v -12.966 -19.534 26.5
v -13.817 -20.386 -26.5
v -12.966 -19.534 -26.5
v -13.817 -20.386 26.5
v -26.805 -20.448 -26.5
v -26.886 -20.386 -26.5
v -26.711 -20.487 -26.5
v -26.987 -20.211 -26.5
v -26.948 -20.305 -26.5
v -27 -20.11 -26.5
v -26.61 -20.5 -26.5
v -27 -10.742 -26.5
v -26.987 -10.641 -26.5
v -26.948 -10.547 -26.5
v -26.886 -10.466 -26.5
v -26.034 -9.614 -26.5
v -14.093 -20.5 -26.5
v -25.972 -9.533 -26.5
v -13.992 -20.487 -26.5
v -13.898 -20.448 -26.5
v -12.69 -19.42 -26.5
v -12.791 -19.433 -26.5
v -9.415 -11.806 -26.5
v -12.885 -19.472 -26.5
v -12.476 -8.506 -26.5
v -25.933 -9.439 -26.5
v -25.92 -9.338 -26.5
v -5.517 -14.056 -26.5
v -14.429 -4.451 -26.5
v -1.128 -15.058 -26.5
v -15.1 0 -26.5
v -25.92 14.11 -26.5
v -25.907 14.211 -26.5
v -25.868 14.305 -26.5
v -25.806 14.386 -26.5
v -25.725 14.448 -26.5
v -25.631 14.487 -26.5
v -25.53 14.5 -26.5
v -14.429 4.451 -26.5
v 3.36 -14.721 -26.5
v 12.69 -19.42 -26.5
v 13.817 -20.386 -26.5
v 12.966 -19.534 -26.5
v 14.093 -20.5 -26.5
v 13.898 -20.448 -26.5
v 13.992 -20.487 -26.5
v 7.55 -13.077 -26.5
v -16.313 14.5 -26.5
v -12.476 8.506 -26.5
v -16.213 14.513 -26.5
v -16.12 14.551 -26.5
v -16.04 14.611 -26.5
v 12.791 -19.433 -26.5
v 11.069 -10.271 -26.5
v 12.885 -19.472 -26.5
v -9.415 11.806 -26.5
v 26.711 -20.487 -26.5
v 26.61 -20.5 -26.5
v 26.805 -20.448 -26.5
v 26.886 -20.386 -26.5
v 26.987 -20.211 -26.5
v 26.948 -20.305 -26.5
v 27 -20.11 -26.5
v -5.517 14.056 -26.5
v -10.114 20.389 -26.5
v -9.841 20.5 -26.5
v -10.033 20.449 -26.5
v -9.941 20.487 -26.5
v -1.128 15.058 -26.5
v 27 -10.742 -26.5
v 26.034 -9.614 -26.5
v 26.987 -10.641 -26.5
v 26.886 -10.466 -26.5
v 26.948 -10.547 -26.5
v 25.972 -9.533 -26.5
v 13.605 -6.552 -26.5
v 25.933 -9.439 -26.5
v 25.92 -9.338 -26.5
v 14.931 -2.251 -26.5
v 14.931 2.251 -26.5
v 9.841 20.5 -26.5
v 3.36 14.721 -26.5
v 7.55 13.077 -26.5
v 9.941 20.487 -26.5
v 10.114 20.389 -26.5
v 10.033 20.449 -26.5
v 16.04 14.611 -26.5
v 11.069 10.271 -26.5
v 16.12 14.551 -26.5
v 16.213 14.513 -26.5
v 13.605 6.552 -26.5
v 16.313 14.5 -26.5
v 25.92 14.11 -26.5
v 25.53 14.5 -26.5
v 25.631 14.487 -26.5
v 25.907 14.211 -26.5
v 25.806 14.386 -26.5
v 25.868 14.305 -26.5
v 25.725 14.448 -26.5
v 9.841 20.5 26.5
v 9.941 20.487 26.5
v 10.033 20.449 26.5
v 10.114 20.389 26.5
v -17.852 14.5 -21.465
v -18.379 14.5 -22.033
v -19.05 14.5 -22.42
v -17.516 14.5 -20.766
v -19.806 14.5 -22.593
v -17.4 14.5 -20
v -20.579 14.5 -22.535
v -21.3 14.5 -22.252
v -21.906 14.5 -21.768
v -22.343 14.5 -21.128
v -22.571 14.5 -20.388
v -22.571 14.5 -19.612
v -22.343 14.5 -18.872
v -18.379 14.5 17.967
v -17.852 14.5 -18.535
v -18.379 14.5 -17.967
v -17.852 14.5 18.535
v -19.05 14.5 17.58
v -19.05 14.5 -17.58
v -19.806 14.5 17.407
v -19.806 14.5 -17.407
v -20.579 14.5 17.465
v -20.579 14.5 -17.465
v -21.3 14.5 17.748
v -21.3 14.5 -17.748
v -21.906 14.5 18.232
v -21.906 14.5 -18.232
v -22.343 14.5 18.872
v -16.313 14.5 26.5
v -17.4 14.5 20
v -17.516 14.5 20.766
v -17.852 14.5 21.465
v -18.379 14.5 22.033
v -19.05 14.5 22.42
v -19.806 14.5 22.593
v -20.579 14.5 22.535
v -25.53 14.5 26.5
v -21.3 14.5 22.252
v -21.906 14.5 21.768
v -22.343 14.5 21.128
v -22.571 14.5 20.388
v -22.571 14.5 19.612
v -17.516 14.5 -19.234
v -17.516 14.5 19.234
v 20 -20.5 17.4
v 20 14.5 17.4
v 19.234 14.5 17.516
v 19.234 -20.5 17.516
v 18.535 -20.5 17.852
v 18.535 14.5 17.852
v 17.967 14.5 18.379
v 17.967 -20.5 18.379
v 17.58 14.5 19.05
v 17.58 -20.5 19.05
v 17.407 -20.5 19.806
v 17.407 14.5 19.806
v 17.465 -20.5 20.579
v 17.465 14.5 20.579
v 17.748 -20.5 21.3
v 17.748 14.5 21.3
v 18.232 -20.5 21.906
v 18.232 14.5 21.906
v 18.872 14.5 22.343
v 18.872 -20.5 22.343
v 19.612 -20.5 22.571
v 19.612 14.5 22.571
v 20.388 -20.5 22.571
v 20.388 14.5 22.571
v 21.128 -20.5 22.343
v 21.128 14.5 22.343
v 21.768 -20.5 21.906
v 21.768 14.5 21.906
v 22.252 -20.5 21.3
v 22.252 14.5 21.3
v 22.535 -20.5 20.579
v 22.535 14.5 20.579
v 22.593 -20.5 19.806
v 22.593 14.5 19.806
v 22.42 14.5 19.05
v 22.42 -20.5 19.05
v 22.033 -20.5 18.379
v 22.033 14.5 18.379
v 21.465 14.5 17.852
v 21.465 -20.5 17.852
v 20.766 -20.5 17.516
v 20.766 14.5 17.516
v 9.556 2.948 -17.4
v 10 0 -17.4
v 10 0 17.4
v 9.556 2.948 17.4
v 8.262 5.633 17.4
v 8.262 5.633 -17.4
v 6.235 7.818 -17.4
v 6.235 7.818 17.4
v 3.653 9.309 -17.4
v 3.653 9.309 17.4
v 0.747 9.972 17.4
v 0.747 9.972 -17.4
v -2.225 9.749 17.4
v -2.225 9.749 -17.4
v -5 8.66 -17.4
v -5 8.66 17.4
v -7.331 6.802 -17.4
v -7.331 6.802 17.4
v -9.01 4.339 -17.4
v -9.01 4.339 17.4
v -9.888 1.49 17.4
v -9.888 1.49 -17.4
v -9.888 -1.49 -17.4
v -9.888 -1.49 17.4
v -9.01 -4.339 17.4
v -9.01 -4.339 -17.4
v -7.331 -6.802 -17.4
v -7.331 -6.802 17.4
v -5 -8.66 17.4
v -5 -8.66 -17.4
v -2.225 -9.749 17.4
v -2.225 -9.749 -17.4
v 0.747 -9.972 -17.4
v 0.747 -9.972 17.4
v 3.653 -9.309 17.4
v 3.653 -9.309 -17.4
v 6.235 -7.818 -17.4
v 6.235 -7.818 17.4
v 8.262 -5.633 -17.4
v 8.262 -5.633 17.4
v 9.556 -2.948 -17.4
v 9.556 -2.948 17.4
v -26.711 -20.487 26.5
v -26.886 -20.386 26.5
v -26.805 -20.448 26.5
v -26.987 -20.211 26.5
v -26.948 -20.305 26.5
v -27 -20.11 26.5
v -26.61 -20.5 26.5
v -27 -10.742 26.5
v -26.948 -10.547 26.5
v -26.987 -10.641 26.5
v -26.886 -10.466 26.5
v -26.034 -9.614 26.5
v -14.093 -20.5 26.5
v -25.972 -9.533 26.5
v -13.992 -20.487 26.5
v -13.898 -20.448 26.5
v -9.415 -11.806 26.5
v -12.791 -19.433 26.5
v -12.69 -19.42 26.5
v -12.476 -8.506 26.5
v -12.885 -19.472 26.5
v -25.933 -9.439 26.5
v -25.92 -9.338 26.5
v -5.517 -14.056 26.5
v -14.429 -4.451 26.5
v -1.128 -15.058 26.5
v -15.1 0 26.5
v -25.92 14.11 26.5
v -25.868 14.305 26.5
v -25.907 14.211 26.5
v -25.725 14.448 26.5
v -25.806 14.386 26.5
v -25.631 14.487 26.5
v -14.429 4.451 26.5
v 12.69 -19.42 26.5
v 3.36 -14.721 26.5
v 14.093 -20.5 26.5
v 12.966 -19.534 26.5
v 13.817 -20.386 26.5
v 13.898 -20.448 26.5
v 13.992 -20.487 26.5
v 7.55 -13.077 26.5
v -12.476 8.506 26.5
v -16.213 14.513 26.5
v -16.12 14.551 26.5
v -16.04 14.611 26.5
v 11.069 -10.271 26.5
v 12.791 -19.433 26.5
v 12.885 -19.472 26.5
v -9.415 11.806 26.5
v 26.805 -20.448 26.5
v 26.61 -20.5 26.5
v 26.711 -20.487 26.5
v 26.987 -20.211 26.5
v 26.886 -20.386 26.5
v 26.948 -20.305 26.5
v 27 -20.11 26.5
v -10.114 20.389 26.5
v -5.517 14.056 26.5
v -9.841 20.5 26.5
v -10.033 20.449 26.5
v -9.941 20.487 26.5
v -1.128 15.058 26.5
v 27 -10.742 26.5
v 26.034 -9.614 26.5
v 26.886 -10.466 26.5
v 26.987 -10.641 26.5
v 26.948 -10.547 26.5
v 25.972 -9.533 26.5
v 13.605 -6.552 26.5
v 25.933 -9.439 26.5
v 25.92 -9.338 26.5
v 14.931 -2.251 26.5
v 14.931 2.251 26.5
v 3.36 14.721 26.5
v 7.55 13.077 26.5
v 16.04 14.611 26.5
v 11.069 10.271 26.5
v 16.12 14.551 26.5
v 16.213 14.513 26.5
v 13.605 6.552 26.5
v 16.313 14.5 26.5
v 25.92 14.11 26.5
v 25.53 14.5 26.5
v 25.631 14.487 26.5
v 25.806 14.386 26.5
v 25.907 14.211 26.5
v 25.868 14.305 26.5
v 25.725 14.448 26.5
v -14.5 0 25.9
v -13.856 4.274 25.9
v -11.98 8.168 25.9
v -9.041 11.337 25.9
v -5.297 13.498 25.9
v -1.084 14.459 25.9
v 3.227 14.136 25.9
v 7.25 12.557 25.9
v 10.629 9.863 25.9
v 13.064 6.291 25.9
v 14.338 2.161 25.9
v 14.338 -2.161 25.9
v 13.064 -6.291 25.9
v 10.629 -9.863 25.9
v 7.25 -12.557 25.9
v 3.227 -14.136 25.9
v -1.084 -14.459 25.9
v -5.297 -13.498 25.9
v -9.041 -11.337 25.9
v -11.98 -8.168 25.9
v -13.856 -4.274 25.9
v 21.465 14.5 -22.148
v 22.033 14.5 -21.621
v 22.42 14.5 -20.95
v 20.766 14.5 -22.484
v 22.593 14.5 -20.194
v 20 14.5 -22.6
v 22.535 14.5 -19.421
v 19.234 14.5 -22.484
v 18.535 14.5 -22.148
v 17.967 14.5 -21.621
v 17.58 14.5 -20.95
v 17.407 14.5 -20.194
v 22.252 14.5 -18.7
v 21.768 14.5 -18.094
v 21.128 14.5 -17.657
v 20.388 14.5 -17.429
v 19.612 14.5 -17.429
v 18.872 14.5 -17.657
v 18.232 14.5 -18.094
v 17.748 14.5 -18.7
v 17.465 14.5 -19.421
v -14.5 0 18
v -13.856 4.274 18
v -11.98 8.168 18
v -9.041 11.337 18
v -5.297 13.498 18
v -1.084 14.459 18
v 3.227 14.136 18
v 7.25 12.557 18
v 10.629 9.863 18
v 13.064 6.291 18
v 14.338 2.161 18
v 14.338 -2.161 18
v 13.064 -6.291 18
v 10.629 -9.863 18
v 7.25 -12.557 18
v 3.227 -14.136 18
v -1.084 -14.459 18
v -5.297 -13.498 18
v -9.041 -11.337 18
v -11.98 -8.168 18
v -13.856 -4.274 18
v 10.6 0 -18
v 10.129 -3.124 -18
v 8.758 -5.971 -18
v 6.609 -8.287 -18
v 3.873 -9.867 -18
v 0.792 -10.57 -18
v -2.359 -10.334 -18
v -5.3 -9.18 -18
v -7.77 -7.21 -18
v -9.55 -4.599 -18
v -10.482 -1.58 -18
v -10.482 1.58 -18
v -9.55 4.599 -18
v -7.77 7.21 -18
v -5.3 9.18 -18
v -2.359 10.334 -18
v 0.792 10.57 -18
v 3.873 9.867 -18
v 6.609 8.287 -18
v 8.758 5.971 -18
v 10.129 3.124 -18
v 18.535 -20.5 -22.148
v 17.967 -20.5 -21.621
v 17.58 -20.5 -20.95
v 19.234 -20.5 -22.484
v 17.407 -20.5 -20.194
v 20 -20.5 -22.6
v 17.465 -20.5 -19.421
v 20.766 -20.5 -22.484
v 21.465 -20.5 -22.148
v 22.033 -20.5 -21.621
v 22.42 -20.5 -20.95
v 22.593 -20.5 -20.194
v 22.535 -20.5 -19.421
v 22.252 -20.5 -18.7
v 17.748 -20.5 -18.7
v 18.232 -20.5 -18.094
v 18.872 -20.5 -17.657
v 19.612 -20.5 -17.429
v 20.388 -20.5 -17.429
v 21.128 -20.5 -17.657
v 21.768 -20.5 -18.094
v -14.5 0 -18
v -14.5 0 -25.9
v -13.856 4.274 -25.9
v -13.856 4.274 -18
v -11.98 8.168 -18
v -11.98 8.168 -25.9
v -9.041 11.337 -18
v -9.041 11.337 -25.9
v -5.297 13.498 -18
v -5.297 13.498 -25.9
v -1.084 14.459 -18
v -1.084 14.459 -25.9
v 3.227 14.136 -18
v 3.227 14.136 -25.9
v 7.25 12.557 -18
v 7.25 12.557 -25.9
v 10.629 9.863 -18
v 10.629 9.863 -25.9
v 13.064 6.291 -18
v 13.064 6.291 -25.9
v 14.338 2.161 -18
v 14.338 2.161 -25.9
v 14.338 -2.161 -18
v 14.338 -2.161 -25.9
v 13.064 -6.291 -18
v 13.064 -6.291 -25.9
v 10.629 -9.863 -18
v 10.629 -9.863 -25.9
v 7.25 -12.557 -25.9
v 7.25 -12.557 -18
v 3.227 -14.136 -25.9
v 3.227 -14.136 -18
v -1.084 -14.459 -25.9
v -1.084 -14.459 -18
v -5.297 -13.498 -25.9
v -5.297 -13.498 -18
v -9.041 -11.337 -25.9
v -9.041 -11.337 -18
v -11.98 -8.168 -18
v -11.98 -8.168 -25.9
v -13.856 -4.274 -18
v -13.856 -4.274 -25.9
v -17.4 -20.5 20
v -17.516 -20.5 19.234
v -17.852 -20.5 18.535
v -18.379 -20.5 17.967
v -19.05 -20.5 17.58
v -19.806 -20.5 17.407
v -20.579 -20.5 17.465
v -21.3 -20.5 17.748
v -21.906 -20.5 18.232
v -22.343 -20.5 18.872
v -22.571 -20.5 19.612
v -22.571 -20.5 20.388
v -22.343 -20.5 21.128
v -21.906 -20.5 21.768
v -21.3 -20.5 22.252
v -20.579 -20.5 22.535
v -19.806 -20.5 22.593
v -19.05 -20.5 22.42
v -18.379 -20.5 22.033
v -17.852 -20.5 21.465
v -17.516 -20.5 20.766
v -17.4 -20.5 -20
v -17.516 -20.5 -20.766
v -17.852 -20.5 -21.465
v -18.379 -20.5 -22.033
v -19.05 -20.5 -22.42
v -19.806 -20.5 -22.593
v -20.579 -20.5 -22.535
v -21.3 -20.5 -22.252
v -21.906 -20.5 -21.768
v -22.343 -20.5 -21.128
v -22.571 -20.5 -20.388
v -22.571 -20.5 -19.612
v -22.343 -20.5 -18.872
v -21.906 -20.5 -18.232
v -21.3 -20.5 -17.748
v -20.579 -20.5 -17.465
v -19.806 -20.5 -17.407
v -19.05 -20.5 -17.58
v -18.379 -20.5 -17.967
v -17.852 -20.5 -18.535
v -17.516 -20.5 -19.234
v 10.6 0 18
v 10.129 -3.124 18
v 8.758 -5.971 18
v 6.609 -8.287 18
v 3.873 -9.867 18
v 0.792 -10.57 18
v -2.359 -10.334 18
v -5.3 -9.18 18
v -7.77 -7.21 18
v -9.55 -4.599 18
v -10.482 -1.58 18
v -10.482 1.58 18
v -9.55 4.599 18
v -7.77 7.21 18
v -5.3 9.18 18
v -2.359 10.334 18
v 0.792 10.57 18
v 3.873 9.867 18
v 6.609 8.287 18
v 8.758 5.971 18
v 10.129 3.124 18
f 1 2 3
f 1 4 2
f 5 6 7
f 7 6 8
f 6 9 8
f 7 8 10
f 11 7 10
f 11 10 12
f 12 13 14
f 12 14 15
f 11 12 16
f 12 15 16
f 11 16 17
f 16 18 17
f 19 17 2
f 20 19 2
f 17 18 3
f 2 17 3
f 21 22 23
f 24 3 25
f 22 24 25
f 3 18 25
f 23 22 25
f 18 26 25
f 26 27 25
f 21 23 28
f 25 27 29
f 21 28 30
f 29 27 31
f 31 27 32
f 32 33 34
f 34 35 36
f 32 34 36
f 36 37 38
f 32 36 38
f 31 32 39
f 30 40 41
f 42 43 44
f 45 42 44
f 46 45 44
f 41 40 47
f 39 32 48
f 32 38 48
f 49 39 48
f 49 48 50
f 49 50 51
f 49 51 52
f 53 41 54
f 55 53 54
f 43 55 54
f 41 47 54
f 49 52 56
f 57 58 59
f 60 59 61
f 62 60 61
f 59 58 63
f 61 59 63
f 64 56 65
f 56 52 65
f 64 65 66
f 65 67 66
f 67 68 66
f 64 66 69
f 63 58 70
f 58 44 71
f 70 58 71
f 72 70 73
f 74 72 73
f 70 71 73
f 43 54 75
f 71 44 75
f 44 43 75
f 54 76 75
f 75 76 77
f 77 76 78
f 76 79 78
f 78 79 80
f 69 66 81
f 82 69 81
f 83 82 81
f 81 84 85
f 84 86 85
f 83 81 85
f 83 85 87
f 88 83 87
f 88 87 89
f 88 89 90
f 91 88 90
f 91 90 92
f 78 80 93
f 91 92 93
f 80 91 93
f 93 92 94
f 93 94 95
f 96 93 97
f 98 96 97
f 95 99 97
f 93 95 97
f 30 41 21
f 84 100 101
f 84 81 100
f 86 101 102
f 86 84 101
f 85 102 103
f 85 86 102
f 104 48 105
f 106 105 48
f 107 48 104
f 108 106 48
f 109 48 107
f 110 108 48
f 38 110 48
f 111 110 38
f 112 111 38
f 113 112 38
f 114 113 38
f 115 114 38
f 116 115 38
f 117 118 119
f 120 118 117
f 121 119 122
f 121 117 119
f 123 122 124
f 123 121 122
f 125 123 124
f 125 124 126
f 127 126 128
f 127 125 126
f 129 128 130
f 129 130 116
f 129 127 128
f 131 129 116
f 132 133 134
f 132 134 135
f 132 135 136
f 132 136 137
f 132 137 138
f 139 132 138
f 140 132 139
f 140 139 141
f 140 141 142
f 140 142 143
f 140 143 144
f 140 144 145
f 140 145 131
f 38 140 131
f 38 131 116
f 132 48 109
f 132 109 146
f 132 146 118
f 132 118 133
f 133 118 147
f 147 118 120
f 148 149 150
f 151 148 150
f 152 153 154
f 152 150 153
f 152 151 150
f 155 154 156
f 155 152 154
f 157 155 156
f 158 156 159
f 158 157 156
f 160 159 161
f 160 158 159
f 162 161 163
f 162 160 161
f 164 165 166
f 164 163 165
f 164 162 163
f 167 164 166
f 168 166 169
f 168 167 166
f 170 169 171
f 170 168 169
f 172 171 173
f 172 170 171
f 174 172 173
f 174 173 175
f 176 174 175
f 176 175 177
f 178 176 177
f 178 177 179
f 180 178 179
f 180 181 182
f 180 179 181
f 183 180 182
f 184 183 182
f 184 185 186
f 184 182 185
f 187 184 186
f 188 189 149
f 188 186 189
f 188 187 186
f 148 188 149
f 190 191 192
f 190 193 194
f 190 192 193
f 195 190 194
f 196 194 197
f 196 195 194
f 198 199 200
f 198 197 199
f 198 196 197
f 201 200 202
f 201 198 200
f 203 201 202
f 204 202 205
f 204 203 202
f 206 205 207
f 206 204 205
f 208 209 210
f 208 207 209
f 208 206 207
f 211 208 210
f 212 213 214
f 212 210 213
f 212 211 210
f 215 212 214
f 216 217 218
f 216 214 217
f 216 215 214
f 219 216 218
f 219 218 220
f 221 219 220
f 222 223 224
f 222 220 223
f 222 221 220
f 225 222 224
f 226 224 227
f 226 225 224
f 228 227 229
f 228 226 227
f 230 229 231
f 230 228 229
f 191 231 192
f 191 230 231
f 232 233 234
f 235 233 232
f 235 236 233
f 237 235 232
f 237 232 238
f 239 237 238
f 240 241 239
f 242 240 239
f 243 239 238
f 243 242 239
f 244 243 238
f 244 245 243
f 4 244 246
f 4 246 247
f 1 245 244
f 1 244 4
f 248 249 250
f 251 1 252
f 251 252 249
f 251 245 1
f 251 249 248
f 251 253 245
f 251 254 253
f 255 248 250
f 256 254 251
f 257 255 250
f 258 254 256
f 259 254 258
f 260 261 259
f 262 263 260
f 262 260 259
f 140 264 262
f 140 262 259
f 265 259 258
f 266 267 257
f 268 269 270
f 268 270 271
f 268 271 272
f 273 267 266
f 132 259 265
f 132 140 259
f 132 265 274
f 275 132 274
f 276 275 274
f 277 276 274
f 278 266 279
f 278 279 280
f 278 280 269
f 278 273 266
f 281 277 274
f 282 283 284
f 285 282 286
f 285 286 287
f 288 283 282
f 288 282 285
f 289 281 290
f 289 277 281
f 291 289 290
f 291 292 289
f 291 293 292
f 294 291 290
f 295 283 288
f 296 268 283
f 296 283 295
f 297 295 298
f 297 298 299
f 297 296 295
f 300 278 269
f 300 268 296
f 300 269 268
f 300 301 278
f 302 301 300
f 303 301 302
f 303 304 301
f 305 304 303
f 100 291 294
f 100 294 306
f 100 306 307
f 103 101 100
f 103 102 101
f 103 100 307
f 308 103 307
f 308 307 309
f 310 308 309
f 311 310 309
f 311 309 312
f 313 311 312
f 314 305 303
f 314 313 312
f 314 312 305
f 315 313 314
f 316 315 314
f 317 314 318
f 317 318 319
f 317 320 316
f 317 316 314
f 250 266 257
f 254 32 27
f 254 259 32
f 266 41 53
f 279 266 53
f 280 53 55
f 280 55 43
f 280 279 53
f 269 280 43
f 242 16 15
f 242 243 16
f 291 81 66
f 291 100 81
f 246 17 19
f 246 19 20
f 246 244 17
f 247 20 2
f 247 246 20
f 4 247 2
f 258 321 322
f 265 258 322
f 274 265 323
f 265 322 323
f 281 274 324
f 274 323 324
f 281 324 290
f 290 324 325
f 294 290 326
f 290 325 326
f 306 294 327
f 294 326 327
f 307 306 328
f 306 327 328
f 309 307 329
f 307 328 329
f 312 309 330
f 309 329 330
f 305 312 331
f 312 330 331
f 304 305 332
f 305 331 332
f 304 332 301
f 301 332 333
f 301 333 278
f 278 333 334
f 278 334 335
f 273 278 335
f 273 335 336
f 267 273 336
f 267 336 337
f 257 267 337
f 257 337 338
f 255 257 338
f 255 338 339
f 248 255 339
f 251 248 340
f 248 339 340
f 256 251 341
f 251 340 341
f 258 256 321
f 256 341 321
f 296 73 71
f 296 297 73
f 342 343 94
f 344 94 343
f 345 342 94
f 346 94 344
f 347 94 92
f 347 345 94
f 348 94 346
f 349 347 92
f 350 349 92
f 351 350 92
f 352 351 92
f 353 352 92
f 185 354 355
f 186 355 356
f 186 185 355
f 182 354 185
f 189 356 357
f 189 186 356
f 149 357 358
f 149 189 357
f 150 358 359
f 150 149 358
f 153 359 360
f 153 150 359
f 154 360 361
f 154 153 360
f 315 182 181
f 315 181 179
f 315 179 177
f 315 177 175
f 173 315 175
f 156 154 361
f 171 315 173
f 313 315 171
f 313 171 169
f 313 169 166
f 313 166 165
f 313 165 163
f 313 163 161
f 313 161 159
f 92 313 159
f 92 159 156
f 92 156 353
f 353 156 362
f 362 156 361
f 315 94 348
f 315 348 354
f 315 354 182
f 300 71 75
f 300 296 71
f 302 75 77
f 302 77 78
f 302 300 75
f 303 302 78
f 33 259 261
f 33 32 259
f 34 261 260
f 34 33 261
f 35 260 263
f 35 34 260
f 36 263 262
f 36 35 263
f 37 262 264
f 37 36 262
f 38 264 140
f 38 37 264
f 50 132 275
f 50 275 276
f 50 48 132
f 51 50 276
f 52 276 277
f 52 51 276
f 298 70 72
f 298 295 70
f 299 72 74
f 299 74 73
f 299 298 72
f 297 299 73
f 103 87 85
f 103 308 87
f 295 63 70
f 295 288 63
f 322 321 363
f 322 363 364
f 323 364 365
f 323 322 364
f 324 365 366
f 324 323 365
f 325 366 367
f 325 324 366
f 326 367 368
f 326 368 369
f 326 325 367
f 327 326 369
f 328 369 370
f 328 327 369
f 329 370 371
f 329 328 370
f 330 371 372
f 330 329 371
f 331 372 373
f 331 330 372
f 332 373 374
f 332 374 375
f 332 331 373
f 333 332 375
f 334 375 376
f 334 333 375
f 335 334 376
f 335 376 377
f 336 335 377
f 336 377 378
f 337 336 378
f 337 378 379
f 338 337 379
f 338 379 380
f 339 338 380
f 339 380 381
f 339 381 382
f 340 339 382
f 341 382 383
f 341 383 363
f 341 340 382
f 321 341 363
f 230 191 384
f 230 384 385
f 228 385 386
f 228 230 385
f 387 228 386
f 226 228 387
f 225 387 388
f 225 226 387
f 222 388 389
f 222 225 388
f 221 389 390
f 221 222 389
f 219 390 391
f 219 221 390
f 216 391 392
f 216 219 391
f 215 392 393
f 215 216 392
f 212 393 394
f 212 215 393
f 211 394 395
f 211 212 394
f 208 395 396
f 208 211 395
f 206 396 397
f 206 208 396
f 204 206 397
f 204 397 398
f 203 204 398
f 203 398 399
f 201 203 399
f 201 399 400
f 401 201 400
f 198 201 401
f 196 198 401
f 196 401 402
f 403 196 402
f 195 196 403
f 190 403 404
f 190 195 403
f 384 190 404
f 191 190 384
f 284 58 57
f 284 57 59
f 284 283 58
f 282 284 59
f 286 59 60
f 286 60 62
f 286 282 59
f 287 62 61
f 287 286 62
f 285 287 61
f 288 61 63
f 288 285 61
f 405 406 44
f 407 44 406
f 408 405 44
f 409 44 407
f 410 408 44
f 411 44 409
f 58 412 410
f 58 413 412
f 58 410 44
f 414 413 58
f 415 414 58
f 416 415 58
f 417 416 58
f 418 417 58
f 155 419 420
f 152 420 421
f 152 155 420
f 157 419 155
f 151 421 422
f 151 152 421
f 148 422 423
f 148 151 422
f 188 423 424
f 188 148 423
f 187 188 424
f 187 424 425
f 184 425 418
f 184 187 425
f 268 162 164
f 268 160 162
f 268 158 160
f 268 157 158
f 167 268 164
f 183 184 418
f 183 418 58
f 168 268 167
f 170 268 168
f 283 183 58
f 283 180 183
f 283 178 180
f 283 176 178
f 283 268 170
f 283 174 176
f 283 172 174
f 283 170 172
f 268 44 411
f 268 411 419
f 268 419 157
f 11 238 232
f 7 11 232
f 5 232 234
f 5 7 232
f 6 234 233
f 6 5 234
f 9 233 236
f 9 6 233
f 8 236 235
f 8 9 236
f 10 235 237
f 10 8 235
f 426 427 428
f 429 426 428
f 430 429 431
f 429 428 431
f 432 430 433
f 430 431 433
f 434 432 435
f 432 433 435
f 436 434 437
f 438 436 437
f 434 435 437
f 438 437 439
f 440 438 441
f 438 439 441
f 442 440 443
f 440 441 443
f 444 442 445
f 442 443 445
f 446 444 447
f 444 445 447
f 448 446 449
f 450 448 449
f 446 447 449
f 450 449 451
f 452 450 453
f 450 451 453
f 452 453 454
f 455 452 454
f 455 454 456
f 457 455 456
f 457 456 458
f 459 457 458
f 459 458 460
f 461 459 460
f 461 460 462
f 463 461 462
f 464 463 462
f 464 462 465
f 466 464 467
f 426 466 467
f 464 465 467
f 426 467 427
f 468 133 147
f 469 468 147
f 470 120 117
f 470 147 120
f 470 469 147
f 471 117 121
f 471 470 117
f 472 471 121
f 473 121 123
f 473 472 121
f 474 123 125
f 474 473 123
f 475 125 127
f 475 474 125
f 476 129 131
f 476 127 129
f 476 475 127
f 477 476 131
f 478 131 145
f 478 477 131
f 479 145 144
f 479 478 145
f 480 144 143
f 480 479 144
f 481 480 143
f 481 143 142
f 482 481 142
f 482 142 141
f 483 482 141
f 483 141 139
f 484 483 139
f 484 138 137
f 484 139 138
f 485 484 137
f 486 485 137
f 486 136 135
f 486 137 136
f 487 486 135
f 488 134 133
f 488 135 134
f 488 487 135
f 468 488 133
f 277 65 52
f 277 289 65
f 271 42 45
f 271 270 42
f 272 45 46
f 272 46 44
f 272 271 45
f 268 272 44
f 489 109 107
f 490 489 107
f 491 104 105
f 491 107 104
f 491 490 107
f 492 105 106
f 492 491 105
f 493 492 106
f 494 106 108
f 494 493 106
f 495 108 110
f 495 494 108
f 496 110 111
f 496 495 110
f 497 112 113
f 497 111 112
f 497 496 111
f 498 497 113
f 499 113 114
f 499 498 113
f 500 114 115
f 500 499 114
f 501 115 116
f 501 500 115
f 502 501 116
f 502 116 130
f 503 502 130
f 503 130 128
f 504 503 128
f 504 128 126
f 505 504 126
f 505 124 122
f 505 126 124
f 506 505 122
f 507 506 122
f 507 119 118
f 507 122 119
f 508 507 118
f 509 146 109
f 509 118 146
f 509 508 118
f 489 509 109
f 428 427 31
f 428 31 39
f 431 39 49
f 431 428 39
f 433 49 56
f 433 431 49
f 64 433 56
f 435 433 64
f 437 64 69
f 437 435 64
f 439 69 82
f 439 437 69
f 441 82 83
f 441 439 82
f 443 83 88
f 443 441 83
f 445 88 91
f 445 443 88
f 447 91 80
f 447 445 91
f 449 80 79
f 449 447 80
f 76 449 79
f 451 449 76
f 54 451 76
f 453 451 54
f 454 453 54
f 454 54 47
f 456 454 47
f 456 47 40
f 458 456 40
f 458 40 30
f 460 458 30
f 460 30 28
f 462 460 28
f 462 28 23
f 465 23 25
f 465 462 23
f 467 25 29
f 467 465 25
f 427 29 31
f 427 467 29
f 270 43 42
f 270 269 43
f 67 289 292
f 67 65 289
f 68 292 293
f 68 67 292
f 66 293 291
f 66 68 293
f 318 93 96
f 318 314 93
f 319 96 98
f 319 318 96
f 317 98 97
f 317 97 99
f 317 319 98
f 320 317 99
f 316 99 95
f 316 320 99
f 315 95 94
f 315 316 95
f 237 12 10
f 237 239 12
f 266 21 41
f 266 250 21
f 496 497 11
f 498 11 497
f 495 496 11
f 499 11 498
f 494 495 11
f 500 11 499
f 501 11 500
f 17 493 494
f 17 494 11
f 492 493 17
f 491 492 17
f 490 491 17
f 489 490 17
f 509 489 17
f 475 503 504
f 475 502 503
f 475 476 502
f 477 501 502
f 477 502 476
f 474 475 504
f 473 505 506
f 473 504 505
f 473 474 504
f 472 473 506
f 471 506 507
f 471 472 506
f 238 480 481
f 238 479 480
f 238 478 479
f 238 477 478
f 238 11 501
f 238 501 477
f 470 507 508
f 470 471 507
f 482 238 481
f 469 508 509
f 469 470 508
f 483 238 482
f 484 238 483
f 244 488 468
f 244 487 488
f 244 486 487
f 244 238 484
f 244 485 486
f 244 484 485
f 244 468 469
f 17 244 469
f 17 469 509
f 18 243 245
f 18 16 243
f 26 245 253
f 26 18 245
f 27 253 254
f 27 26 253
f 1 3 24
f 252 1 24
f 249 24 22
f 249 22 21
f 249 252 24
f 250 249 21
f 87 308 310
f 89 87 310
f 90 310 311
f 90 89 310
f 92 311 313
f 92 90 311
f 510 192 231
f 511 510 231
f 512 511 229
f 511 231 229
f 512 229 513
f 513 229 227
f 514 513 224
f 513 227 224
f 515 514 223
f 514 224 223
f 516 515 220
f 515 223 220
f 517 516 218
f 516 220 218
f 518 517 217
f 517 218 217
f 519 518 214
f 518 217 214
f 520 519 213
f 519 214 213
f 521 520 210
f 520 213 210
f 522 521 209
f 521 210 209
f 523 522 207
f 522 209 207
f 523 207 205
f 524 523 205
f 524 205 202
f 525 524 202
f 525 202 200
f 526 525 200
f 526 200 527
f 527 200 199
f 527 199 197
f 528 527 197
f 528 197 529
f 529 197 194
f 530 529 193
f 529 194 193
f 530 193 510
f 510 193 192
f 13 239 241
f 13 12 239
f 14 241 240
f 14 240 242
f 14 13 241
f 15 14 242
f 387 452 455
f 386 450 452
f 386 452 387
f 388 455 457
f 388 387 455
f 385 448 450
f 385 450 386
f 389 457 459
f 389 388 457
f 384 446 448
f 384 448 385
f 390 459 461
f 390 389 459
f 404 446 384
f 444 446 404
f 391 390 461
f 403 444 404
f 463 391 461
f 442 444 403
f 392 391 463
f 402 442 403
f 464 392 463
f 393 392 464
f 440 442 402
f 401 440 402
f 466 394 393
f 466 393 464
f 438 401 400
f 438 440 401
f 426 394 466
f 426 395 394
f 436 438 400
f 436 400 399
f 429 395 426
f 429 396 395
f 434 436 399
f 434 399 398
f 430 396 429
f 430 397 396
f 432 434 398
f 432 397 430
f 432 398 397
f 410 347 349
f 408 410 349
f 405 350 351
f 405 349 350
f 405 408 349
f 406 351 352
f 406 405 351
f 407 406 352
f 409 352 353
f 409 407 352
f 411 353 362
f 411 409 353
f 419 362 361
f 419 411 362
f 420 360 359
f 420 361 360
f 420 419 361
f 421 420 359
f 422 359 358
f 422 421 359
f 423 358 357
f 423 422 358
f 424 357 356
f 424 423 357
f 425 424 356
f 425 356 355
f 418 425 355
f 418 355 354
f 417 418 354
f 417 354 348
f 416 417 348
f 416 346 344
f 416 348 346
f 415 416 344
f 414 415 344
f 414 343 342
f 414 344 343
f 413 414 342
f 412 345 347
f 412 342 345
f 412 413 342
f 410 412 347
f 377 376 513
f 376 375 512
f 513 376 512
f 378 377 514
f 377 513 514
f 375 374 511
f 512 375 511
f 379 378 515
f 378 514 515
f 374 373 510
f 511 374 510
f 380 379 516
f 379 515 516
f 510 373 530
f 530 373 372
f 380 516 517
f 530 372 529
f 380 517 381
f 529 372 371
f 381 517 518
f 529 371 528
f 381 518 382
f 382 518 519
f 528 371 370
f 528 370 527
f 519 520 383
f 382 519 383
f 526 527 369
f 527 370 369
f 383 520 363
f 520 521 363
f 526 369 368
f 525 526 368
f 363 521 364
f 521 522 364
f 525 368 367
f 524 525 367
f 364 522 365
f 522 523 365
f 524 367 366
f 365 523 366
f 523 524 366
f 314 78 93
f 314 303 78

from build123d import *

# Parameters (mm, degrees)
SKETCH2_R               = 10
BOSS_EXTRUDE1_DEPTH     = 26.5
CUT_EXTRUDE1_DEPTH      = 44.029059948
CUT_EXTRUDE1_DEPTH_BACK = 44.029059948
SKETCH3_R               = 2.6
SKETCH12_R              = 14.5
CUT_EXTRUDE9_DEPTH      = 8.5
CHAMFER1_SIZE           = 0.6
FILLET1_R               = 0.39


with BuildPart() as part:
    # Sketch2 → Boss-Extrude1 (new, symmetric)
    with BuildSketch(Plane.XY):
        Polygon((-27, -20.5), (-13.931623932, -20.5), (-12.851623932, -19.42), (12.851623932, -19.42), (13.931623932, -20.5), (27, -20.5), (27, -10.58), (25.92, -9.5), (25.92, 14.5), (16.153846154, 14.5), (10, 20.5), (-10, 20.5), (-16.153846154, 14.5), (-25.92, 14.5), (-25.92, -9.5), (-27, -10.58), align=None)
        Circle(SKETCH2_R, mode=Mode.SUBTRACT)
    extrude(amount=BOSS_EXTRUDE1_DEPTH, both=True)

    # Sketch3 → Cut-Extrude1 (cut, two sides: drawn at the far end of the back side and taken through both)
    with BuildSketch(Plane(origin=(0, 0, 0), x_dir=(1, 0, 0), z_dir=(0, 1, 0)).offset(-CUT_EXTRUDE1_DEPTH_BACK)):
        with Locations((-20, 20)):
            Circle(SKETCH3_R)
        with Locations(Location((20, 20, 0), (0, 0, 90))):
            Circle(SKETCH3_R)
        with Locations(Location((20, -20, 0), (0, 0, 90))):
            Circle(SKETCH3_R)
        with Locations((-20, -20)):
            Circle(SKETCH3_R)
    extrude(amount=CUT_EXTRUDE1_DEPTH + CUT_EXTRUDE1_DEPTH_BACK, mode=Mode.SUBTRACT)

    # Sketch12 → Cut-Extrude9 (cut)
    with BuildSketch(Plane(origin=(0, 0, -26.5), x_dir=(-1, 0, 0), z_dir=(0, 0, -1))):
        Circle(SKETCH12_R)
    cut_extrude9 = extrude(amount=-CUT_EXTRUDE9_DEPTH, mode=Mode.SUBTRACT)

    # Mirror1: Cut-Extrude9 across plane
    add(cut_extrude9.mirror(Plane.XY), mode=Mode.SUBTRACT)

    # Chamfer1
    chamfer1_edges = [part.edges().sort_by_distance(p)[0] for p in [
        (-10, 0, -18),
        (14.5, 0, -26.5),
        (14.5, 0, 26.5),
        (-10, 0, 18),
    ]]
    chamfer(chamfer1_edges, length=CHAMFER1_SIZE)

    # Fillet1
    fillet1_edges = [part.edges().sort_by_distance(p)[0] for p in [
        (-27, -10.58, 0),
        (-25.92, -9.5, 0),
        (-25.92, 14.5, 0),
        (-16.153846154, 14.5, 0),
        (-10, 20.5, 0),
        (10, 20.5, 0),
        (16.153846154, 14.5, 0),
        (25.92, 14.5, 0),
        (25.92, -9.5, 0),
        (27, -10.58, 0),
        (27, -20.5, 0),
        (13.931623932, -20.5, 0),
        (12.851623932, -19.42, 0),
        (-12.851623932, -19.42, 0),
        (-13.931623932, -20.5, 0),
        (-27, -20.5, 0),
    ]]
    fillet(fillet1_edges, radius=FILLET1_R)


solid = part.part
